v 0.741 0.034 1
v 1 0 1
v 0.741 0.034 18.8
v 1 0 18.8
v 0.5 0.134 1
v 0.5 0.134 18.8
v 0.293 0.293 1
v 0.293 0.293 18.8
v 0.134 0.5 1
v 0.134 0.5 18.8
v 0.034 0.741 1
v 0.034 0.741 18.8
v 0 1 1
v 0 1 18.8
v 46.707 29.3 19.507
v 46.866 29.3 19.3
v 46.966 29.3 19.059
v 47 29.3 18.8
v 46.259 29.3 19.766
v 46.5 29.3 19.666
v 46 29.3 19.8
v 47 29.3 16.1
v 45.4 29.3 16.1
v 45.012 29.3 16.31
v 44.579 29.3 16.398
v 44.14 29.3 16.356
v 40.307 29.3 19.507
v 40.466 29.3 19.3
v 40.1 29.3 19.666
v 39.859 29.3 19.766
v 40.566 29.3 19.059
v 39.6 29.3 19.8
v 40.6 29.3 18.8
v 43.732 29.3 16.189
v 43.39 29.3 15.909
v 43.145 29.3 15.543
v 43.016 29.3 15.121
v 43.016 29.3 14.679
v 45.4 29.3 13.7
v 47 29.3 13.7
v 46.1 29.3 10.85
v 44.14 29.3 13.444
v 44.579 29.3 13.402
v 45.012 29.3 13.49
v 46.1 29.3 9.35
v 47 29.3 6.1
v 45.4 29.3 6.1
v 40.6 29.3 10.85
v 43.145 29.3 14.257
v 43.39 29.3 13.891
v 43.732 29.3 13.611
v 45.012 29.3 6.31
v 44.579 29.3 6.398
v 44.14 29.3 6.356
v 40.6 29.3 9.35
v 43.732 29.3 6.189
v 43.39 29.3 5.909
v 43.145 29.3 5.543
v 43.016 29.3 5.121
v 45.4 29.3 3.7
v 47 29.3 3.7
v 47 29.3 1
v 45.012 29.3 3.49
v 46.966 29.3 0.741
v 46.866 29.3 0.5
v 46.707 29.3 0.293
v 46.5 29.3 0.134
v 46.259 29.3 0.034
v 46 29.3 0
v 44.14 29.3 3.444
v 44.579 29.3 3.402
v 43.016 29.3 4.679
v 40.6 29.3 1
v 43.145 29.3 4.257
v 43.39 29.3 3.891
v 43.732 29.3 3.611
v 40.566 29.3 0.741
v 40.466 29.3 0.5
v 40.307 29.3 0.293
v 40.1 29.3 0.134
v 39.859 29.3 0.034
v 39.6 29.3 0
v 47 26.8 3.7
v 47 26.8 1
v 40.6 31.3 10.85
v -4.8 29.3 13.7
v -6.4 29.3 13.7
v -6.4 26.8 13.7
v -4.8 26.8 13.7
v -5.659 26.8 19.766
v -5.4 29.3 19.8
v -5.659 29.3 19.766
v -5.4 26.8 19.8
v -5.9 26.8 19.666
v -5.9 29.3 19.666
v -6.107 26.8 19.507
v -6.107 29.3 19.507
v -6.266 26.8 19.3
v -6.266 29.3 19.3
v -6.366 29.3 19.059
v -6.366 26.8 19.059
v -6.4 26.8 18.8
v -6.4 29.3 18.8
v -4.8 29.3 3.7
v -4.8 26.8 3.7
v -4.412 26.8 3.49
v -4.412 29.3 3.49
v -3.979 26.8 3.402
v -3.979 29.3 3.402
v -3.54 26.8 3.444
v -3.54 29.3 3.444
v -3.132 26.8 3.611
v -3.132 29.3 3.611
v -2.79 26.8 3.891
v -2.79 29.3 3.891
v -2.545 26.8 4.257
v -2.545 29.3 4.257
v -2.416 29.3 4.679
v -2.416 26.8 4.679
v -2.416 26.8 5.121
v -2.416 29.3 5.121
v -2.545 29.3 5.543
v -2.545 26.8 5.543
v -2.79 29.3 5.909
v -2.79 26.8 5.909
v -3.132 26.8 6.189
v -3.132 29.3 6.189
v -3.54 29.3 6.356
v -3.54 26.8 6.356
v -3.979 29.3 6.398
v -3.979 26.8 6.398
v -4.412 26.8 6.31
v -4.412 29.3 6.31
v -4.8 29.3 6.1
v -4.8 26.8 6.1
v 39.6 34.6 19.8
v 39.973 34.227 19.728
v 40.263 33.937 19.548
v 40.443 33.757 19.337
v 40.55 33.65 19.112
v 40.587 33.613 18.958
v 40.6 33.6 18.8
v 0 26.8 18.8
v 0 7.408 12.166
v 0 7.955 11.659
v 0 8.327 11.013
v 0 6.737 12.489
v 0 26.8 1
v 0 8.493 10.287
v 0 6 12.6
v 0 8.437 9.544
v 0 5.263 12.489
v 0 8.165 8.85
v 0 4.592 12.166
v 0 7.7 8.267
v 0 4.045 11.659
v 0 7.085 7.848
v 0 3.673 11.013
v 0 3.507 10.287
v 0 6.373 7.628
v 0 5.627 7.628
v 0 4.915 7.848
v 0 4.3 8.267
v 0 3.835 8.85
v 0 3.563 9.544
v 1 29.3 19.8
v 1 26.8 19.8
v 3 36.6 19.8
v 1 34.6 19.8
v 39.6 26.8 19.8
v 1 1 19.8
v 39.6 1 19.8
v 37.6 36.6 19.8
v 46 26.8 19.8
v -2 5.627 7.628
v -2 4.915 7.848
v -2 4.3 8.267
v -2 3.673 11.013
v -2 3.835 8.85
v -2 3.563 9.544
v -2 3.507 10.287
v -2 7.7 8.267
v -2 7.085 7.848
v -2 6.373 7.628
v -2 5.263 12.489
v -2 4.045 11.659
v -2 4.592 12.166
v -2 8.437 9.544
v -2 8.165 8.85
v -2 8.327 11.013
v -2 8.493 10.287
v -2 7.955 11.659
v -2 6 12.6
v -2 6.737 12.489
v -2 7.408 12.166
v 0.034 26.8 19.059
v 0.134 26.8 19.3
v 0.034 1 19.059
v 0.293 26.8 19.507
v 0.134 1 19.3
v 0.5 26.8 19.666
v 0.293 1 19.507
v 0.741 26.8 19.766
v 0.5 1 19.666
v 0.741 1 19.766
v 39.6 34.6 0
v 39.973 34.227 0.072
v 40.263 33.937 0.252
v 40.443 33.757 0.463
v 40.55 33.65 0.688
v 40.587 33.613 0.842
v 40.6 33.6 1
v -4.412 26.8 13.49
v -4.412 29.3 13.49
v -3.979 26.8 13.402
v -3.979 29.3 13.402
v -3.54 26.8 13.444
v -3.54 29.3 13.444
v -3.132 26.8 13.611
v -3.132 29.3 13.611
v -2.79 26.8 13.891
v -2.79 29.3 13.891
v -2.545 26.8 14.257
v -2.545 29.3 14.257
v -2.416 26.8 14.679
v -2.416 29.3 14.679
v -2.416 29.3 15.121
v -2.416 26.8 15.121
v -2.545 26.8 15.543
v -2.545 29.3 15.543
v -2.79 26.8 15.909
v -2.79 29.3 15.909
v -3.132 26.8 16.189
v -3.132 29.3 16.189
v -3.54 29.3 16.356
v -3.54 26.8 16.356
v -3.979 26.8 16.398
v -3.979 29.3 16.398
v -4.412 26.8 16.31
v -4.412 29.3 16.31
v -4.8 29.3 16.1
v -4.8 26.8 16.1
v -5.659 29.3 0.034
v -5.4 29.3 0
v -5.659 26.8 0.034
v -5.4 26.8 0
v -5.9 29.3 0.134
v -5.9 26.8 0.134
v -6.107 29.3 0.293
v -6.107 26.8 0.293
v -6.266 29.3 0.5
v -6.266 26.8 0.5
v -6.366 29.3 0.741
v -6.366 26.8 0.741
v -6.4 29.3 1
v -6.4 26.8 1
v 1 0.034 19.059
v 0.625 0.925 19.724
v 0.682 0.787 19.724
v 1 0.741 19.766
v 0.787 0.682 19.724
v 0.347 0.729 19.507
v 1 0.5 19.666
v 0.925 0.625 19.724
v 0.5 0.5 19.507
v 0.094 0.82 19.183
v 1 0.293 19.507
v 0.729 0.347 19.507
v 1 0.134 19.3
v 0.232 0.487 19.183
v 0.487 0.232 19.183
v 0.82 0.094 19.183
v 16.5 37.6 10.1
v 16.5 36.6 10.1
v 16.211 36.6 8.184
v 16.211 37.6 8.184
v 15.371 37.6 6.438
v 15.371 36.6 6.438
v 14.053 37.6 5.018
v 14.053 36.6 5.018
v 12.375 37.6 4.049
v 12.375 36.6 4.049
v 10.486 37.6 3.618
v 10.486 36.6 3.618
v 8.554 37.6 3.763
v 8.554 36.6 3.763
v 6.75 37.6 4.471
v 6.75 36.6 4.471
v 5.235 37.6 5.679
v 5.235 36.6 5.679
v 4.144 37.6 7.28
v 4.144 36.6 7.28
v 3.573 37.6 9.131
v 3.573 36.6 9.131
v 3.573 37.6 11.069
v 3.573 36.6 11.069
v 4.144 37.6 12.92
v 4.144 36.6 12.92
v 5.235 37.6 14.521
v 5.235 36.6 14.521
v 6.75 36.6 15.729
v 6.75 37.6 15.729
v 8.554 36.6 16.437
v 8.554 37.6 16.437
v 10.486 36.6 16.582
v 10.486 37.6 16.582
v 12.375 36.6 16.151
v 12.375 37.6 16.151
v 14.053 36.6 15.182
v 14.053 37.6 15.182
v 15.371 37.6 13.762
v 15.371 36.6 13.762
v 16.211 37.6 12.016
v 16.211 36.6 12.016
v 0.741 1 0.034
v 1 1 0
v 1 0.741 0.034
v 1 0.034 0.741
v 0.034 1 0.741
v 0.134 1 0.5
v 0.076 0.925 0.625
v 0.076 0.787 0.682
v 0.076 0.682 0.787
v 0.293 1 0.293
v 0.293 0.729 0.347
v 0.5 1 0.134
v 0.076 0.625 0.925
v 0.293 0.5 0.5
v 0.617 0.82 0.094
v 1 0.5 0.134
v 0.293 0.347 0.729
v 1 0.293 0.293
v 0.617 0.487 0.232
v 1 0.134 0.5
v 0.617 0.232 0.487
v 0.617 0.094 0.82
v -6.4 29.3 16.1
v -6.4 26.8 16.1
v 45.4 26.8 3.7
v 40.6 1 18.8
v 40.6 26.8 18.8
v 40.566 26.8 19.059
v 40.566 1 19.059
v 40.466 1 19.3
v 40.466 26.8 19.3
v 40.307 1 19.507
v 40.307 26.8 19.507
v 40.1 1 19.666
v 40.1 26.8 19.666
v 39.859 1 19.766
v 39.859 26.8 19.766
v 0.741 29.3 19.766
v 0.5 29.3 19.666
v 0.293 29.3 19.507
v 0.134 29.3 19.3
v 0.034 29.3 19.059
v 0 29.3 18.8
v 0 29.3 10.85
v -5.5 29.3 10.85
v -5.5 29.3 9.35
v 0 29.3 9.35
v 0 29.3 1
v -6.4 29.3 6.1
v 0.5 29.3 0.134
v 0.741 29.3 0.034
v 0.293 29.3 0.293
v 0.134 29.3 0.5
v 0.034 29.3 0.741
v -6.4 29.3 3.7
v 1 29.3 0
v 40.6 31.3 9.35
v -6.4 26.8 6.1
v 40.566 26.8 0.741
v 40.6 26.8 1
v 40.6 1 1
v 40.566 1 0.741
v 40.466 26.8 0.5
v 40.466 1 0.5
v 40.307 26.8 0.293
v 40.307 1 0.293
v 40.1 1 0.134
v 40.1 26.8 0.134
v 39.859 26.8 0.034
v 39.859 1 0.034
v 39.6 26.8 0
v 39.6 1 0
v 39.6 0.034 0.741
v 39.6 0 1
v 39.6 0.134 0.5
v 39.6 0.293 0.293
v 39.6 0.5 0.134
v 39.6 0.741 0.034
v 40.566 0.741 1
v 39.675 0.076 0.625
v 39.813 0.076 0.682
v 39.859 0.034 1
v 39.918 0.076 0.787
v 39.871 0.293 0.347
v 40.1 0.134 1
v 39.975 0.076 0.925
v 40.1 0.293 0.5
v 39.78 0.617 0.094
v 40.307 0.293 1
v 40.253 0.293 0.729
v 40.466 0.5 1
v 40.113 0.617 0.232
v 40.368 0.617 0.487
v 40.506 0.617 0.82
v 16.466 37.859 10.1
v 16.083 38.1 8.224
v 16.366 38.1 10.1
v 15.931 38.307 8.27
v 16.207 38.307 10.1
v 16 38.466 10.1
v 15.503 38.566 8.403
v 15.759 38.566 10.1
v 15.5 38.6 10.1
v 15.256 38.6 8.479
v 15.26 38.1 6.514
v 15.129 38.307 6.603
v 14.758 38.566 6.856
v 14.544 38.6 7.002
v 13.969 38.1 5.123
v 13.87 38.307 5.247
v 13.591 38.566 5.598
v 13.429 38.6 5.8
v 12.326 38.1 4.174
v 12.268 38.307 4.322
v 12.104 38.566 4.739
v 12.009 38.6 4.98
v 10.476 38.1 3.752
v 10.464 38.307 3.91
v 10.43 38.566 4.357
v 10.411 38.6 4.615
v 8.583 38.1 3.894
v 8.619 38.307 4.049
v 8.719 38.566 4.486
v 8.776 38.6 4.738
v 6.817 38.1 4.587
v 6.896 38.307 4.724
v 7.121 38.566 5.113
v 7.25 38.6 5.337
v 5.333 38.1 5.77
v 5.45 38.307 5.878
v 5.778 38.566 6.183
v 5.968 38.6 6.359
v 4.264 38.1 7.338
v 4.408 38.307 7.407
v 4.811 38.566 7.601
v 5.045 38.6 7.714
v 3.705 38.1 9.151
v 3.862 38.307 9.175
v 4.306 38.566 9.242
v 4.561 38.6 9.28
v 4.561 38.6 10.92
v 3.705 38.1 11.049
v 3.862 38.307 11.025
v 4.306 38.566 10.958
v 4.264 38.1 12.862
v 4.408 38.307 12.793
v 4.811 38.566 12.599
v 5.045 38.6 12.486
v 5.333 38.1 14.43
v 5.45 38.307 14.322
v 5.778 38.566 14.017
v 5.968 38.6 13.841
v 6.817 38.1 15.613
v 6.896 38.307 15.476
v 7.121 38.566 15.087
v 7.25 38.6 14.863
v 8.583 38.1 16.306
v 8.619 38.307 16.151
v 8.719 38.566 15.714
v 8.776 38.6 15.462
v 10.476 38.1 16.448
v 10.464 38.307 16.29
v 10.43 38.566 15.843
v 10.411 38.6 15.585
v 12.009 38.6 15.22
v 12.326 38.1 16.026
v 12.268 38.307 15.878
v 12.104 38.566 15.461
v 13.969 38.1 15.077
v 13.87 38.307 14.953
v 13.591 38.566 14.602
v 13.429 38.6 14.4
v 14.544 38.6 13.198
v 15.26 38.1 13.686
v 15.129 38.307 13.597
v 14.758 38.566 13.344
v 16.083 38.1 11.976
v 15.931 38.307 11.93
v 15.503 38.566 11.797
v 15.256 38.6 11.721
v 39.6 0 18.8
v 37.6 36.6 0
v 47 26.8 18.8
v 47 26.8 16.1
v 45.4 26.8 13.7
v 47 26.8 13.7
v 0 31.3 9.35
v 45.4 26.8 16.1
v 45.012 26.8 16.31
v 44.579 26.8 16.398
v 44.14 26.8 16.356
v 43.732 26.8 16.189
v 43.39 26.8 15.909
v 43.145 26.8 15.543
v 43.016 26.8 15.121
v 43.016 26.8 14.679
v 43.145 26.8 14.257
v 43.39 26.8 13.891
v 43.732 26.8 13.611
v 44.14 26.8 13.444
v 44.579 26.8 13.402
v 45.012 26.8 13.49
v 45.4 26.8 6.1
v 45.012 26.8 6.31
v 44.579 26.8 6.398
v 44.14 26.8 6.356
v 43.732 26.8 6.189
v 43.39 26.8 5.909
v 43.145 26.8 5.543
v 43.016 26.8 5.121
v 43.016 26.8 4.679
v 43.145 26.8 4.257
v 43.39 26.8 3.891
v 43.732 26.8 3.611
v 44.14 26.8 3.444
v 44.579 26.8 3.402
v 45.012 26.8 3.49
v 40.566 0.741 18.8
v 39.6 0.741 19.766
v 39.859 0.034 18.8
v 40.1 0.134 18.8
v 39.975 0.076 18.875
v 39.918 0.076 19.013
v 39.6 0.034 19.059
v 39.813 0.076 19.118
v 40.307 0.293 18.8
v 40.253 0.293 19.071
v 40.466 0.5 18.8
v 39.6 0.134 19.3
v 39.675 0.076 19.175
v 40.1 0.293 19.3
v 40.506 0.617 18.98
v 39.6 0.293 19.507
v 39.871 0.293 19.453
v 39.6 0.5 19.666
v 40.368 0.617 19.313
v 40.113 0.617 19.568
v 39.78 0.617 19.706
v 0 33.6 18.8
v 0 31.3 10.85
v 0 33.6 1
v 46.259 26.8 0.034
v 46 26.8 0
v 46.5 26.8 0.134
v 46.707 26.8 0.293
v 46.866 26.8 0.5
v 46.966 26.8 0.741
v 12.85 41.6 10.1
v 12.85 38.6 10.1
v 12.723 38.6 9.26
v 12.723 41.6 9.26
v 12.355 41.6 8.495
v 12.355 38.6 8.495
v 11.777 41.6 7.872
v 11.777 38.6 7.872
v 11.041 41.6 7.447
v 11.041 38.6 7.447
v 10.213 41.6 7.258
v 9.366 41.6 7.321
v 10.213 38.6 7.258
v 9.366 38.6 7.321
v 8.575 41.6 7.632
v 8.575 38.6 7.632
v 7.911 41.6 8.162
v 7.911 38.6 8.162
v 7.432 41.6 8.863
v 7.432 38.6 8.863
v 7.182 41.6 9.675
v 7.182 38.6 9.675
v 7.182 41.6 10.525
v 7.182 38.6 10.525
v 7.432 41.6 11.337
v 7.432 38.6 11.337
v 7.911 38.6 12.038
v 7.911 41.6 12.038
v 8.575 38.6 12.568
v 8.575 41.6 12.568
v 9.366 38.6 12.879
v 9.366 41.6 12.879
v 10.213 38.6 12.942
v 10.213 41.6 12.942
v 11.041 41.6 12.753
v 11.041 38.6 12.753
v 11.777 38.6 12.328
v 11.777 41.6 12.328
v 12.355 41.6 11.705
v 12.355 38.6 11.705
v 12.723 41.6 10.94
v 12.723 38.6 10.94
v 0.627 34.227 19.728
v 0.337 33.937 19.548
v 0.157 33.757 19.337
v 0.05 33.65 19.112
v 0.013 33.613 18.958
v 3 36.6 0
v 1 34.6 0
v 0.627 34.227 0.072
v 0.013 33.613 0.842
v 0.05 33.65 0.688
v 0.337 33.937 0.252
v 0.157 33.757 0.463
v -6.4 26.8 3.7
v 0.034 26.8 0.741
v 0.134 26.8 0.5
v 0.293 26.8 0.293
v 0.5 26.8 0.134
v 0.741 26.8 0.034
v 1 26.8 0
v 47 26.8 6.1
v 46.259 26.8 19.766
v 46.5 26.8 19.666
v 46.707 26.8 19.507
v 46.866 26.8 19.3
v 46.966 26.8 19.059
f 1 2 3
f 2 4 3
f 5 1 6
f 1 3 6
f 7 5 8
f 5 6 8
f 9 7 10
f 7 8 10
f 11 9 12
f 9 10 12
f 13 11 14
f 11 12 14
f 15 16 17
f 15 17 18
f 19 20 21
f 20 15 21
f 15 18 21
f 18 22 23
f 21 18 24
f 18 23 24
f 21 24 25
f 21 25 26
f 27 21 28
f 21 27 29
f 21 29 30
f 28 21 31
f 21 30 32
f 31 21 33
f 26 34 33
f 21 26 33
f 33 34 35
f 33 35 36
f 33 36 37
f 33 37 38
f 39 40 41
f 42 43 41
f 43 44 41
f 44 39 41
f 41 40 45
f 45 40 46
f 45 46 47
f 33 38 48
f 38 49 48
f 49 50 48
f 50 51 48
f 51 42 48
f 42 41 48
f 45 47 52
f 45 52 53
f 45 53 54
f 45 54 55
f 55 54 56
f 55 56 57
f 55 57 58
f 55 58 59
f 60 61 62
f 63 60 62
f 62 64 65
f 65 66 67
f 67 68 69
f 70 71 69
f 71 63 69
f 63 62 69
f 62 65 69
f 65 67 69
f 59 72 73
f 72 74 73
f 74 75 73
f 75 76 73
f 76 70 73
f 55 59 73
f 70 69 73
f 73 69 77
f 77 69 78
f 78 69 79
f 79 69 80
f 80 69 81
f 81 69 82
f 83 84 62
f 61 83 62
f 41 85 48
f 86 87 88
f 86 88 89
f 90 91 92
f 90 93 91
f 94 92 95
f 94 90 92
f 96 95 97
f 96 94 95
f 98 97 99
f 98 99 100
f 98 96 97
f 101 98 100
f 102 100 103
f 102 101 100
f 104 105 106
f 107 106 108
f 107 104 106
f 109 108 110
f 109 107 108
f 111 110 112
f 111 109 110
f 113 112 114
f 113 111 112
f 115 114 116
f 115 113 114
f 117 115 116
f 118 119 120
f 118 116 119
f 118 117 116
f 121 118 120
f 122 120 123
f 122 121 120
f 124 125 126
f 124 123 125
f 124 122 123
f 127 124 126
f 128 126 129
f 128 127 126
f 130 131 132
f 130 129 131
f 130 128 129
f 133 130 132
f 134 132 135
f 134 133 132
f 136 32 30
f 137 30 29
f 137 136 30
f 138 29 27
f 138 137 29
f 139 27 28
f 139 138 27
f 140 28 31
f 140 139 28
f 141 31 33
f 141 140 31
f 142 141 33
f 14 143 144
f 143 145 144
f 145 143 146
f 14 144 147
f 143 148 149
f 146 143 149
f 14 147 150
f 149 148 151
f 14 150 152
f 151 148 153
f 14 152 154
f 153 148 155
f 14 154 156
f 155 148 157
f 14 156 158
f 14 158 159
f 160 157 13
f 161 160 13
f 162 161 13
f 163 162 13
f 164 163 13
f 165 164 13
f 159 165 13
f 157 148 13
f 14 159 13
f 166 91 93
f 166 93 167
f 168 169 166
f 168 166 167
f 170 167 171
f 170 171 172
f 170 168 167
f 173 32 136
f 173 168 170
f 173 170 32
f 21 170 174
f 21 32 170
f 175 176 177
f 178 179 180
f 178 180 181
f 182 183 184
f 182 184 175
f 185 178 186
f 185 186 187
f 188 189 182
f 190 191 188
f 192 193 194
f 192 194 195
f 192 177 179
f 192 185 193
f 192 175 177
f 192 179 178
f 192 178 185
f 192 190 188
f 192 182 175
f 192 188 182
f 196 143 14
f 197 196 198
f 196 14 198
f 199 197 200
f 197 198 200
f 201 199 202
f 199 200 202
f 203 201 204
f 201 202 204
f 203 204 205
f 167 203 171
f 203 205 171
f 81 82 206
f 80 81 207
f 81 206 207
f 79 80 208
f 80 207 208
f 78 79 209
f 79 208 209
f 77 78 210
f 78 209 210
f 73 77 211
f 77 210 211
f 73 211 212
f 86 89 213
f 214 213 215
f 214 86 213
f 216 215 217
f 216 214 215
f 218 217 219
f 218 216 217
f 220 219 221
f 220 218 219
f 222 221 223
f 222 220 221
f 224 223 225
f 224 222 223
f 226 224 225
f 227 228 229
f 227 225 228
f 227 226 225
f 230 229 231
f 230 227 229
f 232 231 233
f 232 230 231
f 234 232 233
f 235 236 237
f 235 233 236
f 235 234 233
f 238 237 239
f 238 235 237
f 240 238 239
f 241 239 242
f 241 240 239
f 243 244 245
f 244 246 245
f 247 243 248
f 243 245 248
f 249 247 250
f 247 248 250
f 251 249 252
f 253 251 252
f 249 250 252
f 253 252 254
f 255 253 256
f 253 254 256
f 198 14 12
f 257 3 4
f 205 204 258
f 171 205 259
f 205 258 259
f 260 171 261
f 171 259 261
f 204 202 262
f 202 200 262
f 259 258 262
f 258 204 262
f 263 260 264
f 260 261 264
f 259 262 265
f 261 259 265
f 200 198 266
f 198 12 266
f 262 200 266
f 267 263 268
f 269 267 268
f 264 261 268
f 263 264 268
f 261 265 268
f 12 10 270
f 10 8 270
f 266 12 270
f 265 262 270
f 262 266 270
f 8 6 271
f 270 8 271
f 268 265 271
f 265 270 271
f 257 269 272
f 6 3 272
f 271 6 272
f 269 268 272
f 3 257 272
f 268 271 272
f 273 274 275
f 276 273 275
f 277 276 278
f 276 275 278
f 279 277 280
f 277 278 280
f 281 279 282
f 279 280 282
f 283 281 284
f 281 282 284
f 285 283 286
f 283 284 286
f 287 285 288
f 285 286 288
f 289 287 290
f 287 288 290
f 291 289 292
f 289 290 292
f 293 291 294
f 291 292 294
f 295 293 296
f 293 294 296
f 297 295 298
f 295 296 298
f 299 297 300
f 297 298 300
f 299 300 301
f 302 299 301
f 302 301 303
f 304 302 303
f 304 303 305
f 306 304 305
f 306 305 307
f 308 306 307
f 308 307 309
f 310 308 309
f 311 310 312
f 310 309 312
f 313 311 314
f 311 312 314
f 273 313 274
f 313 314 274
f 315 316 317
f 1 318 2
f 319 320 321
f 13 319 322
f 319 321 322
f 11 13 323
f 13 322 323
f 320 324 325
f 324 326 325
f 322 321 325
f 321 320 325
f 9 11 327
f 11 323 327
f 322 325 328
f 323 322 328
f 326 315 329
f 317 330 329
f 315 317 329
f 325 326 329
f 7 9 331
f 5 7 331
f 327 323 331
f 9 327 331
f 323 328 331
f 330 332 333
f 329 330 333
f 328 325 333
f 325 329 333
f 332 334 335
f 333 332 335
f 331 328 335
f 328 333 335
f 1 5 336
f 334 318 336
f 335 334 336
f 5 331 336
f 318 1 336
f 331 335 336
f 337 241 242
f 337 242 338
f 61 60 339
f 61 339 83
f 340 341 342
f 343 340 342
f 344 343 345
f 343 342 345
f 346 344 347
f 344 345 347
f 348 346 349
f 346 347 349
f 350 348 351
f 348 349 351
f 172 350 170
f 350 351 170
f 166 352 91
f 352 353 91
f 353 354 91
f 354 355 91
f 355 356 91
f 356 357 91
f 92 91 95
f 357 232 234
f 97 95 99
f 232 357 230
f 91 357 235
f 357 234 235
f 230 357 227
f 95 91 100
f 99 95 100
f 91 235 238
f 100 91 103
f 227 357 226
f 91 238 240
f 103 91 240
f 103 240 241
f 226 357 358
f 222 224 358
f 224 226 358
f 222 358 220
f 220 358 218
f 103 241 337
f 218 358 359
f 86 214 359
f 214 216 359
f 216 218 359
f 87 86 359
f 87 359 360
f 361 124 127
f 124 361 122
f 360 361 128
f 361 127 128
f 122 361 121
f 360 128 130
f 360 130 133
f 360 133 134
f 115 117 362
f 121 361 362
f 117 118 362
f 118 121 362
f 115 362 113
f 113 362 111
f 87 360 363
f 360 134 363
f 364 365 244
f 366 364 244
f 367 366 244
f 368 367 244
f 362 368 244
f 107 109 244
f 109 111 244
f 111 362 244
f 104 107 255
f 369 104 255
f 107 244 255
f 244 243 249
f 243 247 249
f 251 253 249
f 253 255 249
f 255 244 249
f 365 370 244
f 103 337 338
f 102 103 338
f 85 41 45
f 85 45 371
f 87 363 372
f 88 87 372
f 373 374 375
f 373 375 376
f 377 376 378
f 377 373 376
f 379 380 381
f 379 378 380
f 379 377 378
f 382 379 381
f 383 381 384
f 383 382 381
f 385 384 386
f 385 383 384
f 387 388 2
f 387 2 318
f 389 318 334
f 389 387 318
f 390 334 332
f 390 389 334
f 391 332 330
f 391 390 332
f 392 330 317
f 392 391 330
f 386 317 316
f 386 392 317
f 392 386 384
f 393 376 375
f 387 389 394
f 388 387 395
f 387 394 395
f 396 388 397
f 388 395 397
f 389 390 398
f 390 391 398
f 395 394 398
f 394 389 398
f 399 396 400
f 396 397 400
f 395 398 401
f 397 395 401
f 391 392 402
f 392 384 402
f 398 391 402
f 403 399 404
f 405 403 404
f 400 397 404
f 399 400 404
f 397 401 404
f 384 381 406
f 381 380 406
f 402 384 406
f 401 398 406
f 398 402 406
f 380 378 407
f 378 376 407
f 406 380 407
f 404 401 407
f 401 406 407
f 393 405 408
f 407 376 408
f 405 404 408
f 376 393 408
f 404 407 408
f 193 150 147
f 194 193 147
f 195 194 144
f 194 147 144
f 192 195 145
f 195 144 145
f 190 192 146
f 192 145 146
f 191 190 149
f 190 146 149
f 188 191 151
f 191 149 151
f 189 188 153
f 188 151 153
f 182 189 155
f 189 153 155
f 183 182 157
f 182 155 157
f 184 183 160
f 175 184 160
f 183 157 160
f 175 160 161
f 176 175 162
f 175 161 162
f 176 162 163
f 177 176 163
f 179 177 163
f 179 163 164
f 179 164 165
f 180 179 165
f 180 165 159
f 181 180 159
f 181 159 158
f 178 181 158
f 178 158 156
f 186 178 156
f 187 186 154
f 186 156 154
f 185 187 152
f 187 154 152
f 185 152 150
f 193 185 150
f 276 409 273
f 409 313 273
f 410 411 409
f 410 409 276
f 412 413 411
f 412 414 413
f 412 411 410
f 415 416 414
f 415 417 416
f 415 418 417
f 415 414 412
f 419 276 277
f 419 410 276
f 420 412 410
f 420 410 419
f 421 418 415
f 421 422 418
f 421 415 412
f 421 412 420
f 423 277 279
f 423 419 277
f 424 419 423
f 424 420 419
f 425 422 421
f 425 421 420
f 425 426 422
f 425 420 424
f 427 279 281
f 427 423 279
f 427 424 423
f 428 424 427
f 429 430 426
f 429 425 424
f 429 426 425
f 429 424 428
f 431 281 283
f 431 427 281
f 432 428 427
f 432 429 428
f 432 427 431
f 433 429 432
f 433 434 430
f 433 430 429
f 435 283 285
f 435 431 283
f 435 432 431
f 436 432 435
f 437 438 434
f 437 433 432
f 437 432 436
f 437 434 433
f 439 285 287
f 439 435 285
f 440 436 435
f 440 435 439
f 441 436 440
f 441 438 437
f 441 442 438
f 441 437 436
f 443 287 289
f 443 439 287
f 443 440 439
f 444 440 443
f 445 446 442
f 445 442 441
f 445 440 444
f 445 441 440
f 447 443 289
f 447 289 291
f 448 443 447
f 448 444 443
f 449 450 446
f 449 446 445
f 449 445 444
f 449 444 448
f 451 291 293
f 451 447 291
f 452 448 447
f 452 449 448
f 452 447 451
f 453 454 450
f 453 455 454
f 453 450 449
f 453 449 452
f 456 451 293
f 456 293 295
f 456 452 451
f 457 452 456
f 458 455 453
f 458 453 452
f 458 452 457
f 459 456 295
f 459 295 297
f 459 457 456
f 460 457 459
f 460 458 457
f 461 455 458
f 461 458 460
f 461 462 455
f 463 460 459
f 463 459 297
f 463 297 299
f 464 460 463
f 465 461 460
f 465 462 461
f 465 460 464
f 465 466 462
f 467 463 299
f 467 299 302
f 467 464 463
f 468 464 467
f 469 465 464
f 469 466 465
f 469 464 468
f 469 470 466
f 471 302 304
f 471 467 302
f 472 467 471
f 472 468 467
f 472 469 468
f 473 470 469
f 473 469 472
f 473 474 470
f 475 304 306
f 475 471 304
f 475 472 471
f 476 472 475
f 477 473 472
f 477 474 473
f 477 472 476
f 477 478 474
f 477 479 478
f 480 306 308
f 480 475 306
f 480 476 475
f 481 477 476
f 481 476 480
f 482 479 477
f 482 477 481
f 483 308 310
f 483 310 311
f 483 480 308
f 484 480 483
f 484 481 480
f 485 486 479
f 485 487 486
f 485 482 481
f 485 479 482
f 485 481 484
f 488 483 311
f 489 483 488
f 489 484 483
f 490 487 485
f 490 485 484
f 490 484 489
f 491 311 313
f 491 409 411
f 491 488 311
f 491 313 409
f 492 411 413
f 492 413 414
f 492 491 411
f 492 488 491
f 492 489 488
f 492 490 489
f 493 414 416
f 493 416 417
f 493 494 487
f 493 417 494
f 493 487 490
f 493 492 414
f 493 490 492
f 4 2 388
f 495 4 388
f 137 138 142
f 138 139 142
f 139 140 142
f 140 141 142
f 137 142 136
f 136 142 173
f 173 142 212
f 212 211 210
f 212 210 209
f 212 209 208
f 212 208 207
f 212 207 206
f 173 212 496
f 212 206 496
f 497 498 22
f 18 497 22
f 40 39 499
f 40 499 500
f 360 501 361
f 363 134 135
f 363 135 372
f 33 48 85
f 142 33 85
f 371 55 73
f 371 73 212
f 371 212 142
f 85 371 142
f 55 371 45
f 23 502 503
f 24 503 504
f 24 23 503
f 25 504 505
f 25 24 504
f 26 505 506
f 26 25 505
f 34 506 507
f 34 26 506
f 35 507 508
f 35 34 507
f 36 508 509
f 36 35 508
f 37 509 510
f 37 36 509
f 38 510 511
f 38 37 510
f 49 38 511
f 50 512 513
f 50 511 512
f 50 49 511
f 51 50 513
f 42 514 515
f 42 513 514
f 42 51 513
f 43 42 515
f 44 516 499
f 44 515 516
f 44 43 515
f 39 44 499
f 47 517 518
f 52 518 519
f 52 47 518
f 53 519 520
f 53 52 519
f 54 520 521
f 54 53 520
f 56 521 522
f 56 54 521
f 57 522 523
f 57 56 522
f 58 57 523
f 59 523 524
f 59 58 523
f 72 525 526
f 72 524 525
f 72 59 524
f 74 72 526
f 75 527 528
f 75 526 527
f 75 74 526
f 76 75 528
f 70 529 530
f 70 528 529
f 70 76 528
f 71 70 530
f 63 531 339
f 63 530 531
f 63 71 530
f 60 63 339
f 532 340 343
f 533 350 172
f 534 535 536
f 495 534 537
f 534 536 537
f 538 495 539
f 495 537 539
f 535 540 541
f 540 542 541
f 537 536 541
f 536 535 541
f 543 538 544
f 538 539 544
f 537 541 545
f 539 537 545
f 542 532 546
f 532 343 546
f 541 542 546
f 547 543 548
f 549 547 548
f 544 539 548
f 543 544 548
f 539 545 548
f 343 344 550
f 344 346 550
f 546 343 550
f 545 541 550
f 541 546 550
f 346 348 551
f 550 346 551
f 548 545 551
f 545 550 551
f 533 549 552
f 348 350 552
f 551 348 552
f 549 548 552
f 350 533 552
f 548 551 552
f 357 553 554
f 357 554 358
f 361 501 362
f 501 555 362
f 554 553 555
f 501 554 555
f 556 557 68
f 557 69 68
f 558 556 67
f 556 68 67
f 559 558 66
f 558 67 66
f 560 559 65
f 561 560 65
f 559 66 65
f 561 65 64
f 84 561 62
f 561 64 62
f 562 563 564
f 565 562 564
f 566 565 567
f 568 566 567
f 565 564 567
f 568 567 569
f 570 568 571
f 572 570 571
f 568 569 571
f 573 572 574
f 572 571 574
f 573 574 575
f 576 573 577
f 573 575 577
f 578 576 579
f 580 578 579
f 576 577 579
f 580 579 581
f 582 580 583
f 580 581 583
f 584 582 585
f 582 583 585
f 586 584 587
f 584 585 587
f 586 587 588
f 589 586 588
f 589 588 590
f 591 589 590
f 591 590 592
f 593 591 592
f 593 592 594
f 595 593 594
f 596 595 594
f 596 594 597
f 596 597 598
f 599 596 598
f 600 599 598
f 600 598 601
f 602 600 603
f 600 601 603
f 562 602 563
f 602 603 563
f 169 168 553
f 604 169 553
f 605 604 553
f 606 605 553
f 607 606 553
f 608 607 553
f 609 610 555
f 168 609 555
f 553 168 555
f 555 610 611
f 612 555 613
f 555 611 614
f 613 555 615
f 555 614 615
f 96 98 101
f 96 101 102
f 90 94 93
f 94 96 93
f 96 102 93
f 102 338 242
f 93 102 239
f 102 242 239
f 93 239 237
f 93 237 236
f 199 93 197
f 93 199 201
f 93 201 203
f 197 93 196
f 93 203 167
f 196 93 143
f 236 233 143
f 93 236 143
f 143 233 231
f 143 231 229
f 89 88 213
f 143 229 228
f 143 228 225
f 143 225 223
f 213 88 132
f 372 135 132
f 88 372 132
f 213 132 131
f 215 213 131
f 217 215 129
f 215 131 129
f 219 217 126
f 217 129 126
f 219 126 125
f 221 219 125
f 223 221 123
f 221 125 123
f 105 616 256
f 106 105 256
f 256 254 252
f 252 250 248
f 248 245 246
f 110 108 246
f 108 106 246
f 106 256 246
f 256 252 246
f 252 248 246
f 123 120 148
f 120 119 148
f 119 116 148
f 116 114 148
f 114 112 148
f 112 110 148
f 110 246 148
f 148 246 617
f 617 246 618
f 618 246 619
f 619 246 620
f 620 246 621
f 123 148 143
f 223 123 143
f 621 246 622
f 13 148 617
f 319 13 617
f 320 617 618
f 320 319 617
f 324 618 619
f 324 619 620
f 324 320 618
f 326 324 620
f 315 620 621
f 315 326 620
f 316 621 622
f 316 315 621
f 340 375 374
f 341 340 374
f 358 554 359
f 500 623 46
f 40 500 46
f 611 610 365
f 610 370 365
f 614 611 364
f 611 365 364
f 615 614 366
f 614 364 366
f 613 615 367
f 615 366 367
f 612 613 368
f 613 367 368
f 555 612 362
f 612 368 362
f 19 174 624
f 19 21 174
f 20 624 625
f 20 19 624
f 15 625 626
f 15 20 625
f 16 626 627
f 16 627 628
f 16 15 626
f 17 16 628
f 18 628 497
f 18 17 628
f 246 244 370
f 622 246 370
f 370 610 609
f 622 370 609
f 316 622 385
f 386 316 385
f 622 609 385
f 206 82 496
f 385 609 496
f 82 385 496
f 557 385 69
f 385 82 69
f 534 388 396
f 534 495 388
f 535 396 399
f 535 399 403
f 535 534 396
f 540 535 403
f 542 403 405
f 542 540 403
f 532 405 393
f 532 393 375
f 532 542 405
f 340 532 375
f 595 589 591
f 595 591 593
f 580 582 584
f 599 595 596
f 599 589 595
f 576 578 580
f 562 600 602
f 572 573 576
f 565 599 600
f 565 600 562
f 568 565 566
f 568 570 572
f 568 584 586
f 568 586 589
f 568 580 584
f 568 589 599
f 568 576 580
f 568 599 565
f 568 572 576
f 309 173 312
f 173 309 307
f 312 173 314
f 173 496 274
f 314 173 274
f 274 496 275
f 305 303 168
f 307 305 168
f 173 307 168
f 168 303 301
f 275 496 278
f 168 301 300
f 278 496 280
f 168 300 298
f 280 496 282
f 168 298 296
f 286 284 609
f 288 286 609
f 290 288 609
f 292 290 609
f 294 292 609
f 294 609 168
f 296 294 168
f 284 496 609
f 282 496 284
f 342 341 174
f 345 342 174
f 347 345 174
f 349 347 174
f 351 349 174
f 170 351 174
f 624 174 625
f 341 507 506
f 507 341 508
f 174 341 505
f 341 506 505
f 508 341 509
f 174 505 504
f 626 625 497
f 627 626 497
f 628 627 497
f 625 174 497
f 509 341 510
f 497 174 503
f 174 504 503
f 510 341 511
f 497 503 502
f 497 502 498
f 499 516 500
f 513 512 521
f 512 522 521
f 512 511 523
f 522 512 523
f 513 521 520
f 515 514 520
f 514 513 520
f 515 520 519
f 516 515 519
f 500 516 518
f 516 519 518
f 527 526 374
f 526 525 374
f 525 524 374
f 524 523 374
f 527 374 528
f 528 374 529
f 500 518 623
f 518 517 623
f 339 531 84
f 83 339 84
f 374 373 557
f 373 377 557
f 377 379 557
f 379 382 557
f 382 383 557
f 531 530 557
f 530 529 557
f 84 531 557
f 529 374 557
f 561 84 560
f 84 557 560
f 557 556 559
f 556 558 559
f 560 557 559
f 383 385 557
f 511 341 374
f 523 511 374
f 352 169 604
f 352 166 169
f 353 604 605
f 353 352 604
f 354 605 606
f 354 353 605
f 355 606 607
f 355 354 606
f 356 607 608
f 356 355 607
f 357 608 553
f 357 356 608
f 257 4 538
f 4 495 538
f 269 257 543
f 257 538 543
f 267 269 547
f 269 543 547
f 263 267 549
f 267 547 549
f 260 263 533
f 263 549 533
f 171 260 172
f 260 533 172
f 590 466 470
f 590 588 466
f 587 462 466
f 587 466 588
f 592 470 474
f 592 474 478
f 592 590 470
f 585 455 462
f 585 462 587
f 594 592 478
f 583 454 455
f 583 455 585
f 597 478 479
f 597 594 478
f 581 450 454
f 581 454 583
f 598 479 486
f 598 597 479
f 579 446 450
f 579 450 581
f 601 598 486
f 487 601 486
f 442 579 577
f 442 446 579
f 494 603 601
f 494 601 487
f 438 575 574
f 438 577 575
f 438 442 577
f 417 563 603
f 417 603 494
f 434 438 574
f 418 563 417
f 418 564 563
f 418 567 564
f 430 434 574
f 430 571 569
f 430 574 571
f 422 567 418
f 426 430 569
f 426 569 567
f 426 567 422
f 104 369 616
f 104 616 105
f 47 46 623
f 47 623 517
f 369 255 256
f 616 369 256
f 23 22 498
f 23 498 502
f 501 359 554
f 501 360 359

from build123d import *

# Parameters (mm, degrees)
MAIN_SERVO_BODY_DEPTH       = 19.8
SERVO_BRACKET_DEPTH         = 30.3
SKETCH3_R                   = 6.5
SERVO_AXIS_1_DEPTH          = 2
SERVO_BRACKET_SUPPORT_DEPTH = 0.75
SKETCH5_R                   = 2.85
SERVO_AXIS_2_DEPTH          = 3
SKETCH6_R                   = 2.5
SERVO_WIRES_DEPTH           = 2
SERVO_CONTOURING_R          = 1


with BuildPart() as part:
    # Sketch1 → Main Servo Body (new body)
    with BuildSketch(Plane.XY):
        Polygon((0, 0), (40.6, 0), (40.6, 26.8), (47, 26.8), (47, 29.3), (40.6, 29.3), (40.6, 33.6), (37.6, 36.6), (3, 36.6), (0, 33.6), (0, 29.3), (-6.4, 29.3), (-6.4, 26.8), (0, 26.8), align=None)
    extrude(amount=MAIN_SERVO_BODY_DEPTH)

    # Sketch2 → Servo Bracket (cut, through all)
    with BuildSketch(Plane(origin=(0, 29.3, 0), x_dir=(1, 0, 0), z_dir=(0, 1, 0))):
        with BuildLine():
            Line((-6.4, -3.7), (-4.8, -3.7))
            ThreePointArc((-4.8, -3.7), (-2.4, -4.9), (-4.8, -6.1))
            Line((-4.8, -6.1), (-6.4, -6.1))
            Line((-6.4, -6.1), (-6.4, -3.7))
        make_face()
        with BuildLine():
            Line((45.4, -3.7), (47, -3.7))
            Line((47, -3.7), (47, -6.1))
            Line((47, -6.1), (45.4, -6.1))
            ThreePointArc((45.4, -6.1), (43, -4.9), (45.4, -3.7))
        make_face()
        with BuildLine():
            Line((45.4, -13.7), (47, -13.7))
            Line((47, -13.7), (47, -16.1))
            Line((47, -16.1), (45.4, -16.1))
            ThreePointArc((45.4, -16.1), (43, -14.9), (45.4, -13.7))
        make_face()
        with BuildLine():
            Line((-6.4, -16.1), (-6.4, -13.7))
            Line((-6.4, -13.7), (-4.8, -13.7))
            ThreePointArc((-4.8, -13.7), (-2.4, -14.9), (-4.8, -16.1))
            Line((-4.8, -16.1), (-6.4, -16.1))
        make_face()
    extrude(amount=-SERVO_BRACKET_DEPTH, mode=Mode.SUBTRACT)

    # Sketch3 → Servo Axis 1 (add)
    with BuildSketch(Plane(origin=(0, 36.6, 0), x_dir=(1, 0, 0), z_dir=(0, 1, 0))):
        with Locations((10, -10.1)):
            Circle(SKETCH3_R)
    extrude(amount=SERVO_AXIS_1_DEPTH)

    # Sketch4 → Servo Bracket Support (add, symmetric)
    with BuildSketch(Plane.XY.offset(10.1)):
        Polygon((-5.5, 29.3), (0, 31.3), (0, 29.3), align=None)
        Polygon((40.6, 29.3), (46.1, 29.3), (40.6, 31.3), align=None)
    extrude(amount=SERVO_BRACKET_SUPPORT_DEPTH, both=True)

    # Sketch5 → Servo Axis 2 (add)
    with BuildSketch(Plane(origin=(0, 38.6, 0), x_dir=(1, 0, 0), z_dir=(0, 1, 0))):
        with Locations((10, -10.1)):
            Circle(SKETCH5_R)
    extrude(amount=SERVO_AXIS_2_DEPTH)

    # Sketch6 → Servo Wires (add)
    with BuildSketch(Plane.ZY):
        with Locations((10.1, 6)):
            Circle(SKETCH6_R)
    extrude(amount=SERVO_WIRES_DEPTH)

    # Servo Contouring
    servo_contouring_edges = [part.edges().sort_by_distance(p)[0] for p in [
        (40.6, 13.4, 19.8),
        (3.5, 38.6, 10.1),
        (-6.4, 28.05, 0),
        (0, 31.45, 0),
        (40.6, 31.45, 0),
        (47, 28.05, 19.8),
        (47, 28.05, 0),
        (40.6, 13.4, 0),
        (20.3, 0, 0),
        (0, 13.4, 0),
        (40.6, 31.45, 19.8),
        (40.6, 0, 9.9),
        (0, 0, 9.9),
        (0, 31.45, 19.8),
        (0, 13.4, 19.8),
        (-6.4, 28.05, 19.8),
        (20.3, 0, 19.8),
    ]]
    fillet(servo_contouring_edges, radius=SERVO_CONTOURING_R)


solid = part.part
